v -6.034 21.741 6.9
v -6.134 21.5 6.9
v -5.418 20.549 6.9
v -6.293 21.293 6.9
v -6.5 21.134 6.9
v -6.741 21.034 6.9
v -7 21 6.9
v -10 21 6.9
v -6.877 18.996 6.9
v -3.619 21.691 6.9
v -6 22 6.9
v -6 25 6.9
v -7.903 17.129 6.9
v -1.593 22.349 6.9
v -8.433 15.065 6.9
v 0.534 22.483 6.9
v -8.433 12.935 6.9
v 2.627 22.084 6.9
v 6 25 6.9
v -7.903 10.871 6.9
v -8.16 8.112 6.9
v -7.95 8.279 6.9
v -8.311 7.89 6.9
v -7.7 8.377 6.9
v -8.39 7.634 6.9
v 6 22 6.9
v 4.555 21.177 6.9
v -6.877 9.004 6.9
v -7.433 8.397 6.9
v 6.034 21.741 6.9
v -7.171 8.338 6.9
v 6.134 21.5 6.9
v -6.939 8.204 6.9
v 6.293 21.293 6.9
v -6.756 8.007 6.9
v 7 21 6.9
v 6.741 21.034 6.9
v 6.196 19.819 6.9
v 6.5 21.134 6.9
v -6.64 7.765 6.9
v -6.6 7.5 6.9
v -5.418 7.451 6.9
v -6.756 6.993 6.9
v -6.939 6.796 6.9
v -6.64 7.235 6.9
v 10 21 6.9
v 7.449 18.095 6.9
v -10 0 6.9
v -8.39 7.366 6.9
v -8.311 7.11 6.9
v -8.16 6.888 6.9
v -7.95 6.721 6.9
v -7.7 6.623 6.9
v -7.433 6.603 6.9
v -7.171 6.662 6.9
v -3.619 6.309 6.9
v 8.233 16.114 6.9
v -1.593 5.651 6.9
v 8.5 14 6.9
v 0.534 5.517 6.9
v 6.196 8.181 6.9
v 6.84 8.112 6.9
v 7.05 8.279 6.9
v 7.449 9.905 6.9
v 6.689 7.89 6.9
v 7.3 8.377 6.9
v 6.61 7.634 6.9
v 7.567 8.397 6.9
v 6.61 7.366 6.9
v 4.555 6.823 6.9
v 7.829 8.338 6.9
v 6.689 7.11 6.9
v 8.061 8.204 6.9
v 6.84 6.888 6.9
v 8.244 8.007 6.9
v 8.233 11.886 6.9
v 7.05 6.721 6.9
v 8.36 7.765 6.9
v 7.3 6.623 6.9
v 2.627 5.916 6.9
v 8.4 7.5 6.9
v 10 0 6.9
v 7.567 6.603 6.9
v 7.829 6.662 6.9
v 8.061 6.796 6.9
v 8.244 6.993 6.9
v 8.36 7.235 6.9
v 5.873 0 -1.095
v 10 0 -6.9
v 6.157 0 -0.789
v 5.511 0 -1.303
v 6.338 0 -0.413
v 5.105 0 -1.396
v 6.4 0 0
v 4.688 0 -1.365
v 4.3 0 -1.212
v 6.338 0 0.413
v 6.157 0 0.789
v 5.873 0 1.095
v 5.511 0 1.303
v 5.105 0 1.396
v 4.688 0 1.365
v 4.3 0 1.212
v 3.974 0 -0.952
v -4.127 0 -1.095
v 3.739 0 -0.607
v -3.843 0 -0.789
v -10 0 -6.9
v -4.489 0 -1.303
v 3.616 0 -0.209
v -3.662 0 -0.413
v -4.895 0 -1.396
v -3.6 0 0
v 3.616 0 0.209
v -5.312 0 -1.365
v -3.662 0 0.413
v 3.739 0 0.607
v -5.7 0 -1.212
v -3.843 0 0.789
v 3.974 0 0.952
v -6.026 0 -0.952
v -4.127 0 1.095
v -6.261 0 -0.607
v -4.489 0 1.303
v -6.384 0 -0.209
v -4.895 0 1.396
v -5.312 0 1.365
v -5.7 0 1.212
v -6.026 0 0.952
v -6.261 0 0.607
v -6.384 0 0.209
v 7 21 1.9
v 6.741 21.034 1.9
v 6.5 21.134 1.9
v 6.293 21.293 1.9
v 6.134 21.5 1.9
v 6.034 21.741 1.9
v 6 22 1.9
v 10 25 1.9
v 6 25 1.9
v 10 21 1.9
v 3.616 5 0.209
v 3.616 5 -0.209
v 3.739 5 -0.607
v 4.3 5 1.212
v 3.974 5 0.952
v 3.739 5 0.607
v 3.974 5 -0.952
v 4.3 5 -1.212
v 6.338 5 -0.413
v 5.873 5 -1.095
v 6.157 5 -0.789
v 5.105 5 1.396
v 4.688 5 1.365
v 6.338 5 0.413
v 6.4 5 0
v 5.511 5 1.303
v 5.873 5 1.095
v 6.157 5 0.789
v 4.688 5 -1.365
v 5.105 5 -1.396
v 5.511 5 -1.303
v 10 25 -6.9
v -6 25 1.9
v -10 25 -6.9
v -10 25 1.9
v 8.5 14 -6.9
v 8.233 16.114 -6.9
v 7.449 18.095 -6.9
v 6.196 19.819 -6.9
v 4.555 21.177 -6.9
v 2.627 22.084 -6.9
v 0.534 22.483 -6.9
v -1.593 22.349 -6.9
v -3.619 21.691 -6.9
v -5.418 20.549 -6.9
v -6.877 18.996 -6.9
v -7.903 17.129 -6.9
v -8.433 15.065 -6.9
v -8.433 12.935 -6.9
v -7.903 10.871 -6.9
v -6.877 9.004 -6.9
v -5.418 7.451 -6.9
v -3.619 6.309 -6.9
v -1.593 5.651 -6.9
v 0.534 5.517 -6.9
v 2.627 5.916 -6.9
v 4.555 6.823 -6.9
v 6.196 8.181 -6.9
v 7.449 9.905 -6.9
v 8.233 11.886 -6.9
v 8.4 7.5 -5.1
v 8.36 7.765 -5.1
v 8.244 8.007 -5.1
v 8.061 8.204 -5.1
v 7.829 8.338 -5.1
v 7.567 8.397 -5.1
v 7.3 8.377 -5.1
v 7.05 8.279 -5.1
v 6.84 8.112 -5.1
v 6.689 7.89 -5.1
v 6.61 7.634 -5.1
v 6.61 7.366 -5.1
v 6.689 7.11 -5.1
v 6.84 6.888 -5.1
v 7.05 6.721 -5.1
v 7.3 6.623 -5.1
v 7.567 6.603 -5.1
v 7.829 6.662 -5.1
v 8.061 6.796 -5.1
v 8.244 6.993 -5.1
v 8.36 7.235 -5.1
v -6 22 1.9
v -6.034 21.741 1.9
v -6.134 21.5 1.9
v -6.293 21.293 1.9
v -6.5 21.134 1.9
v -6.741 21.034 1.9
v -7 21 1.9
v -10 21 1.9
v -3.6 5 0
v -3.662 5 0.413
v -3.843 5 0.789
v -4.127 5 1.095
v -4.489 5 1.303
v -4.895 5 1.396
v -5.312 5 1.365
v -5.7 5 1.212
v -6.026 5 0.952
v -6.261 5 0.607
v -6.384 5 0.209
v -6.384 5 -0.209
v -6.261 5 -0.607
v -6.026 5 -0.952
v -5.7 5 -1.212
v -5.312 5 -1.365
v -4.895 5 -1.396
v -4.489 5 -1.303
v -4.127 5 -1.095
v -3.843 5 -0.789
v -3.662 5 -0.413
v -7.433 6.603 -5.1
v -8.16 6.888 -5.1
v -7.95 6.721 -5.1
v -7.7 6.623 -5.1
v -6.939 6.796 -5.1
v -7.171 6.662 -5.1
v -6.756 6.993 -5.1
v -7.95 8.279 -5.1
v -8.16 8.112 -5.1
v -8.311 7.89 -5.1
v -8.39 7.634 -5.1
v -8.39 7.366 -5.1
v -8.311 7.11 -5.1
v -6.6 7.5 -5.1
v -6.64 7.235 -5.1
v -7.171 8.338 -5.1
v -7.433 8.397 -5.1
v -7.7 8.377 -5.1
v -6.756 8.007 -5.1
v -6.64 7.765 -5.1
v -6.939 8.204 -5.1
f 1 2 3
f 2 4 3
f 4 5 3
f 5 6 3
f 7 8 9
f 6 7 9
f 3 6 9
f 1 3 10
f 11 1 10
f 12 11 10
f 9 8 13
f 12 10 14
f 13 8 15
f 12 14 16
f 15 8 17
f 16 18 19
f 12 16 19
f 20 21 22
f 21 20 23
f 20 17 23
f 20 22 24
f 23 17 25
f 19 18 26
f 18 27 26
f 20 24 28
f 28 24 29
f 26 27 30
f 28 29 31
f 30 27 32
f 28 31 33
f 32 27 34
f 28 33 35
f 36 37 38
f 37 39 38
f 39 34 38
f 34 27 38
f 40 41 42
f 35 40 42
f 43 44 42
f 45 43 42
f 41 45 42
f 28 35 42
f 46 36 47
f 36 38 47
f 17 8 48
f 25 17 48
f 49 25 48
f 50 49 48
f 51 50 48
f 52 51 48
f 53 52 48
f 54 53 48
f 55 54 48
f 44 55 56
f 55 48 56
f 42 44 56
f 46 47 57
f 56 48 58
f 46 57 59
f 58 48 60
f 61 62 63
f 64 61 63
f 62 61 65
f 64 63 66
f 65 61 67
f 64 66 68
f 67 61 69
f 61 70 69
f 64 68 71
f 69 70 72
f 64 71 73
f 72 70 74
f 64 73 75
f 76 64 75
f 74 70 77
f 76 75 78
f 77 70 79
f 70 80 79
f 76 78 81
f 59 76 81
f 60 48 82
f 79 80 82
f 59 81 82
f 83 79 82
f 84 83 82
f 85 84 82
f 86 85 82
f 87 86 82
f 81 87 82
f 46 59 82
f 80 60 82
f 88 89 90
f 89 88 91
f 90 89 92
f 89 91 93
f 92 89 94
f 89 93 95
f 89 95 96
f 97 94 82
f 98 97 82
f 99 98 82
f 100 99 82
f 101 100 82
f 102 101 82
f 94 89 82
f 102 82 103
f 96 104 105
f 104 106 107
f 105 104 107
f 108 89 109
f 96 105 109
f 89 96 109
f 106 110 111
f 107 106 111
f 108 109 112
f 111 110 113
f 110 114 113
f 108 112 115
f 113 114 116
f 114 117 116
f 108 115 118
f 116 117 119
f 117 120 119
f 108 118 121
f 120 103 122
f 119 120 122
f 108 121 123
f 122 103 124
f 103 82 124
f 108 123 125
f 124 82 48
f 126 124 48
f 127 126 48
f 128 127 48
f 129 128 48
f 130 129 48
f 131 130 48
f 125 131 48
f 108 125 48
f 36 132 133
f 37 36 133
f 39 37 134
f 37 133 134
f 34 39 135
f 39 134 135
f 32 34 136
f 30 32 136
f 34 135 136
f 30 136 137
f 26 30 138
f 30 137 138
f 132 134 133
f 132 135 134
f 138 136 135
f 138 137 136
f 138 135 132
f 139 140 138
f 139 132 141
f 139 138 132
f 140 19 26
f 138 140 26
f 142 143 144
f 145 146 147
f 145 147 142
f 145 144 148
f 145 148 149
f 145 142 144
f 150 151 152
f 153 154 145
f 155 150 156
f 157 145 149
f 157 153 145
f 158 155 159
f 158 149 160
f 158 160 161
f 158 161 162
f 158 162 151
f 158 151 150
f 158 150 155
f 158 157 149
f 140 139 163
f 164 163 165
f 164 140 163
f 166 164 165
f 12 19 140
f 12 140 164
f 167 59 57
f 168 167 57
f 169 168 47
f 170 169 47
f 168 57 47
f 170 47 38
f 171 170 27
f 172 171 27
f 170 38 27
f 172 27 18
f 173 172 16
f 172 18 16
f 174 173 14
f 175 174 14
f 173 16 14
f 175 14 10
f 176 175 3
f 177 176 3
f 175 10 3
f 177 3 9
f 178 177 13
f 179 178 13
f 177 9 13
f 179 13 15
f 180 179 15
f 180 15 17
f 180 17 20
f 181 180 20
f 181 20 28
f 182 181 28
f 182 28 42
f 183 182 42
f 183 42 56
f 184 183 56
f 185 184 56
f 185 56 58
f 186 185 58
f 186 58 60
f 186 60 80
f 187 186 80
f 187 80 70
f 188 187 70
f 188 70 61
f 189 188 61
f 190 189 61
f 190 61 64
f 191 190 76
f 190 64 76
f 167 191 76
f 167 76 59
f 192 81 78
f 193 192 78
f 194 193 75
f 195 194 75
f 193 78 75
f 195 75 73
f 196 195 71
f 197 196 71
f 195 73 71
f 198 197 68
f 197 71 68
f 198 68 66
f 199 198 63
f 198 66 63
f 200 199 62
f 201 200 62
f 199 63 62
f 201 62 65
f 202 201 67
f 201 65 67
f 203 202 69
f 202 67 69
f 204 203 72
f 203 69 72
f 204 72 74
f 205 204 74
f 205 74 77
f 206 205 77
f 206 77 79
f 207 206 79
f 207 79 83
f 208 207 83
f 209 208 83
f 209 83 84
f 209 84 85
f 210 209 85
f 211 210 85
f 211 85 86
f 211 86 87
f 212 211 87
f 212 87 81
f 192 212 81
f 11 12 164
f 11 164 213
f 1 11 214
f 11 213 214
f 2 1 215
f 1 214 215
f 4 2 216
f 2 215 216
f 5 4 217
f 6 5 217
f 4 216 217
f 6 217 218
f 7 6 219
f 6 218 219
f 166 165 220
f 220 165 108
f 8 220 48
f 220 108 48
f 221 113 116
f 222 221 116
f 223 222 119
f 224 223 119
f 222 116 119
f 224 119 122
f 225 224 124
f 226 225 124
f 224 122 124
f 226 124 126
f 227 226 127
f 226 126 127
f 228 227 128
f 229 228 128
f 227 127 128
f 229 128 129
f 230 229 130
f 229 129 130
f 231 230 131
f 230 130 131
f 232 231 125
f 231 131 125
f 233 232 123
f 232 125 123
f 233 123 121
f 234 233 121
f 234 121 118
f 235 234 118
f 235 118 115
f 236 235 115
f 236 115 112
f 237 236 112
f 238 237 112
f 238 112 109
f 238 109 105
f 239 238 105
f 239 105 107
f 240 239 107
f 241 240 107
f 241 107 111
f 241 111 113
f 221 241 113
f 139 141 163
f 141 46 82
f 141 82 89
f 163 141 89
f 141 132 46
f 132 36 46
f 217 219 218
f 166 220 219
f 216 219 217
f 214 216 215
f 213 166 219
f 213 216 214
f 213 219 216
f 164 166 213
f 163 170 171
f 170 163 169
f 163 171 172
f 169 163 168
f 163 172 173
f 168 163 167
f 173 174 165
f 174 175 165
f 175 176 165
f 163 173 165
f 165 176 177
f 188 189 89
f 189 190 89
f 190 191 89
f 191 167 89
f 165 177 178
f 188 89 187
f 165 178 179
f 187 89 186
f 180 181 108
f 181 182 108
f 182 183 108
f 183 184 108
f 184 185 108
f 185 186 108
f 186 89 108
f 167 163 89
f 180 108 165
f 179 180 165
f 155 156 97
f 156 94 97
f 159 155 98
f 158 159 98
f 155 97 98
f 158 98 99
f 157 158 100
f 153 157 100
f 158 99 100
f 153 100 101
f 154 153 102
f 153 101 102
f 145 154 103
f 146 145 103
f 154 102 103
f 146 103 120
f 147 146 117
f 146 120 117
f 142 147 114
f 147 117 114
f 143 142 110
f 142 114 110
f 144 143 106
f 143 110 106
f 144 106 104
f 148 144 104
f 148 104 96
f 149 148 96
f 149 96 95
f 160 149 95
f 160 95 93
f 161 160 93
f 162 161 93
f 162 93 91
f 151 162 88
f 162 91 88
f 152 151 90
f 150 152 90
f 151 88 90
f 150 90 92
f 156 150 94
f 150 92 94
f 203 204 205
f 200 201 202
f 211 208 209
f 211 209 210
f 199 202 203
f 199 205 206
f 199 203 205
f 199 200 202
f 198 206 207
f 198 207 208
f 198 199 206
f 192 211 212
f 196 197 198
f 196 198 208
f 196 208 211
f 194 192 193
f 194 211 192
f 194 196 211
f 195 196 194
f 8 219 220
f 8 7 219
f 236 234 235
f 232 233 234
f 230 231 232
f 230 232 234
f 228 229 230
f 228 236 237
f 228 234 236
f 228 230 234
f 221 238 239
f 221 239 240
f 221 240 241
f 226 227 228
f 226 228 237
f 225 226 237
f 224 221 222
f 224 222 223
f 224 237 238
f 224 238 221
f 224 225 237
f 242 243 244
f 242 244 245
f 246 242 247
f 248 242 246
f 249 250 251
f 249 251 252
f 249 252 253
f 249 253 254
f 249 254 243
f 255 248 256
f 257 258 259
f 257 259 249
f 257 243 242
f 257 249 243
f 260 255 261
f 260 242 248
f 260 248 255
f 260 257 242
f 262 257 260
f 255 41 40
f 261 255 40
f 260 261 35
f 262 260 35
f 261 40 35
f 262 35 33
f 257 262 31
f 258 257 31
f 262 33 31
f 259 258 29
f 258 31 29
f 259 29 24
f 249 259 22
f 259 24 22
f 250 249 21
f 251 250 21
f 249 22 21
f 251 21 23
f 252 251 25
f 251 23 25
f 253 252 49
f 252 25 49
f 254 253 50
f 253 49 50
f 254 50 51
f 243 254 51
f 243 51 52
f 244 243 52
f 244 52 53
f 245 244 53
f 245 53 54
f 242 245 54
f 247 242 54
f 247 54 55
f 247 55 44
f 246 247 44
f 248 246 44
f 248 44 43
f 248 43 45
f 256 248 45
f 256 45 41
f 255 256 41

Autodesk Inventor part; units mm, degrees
ref_plane "YZ Plane" through (0, 0, 0) normal (1, 0, 0) x (0, 1, 0)
ref_plane "XZ Plane" through (0, 0, 0) normal (0, 1, 0) x (-1, 0, 0)
ref_plane "XY Plane" through (0, 0, 0) normal (0, 0, 1) x (1, 0, 0)
sketch "Sketch1" plane through (0, 0, 0) normal (0, 1, 0) x (-1, 0, 0)
  line L0 (-10, -6.9) -> (10, -6.9)
  line L1 (10, -6.9) -> (10, 6.9)
  line L2 (10, 6.9) -> (-10, 6.9)
  line L3 (-10, 6.9) -> (-10, -6.9)
  line L4 (-10, -6.9) -> (10, 6.9) construction
  line L5 (10, -6.9) -> (-10, 6.9) construction
  point P0 (0, 0)
  dimension "d0" = 20
  dimension "d1" = 13.8
extrude "Extrusion1" add sketch "Sketch1" along normal blind 25
sketch "Sketch2" plane through (-10, 0, 6.9) normal (0, 0, 1) x (1, 0, 0)
  circle A0 centre (10, 14) radius 8.5
  circle A1 centre (2.5, 7.5) radius 0.9
  circle A2 centre (17.5, 7.5) radius 0.9
  point P0 (10, 0)
  dimension "d14" = 17
  dimension "d18" = 1.8
  dimension "d21" = 1.8
extrude "Extrusion2" cut sketch "Sketch2" against normal through all contours A0
sketch "Sketch3" plane through (-10, 0, 6.9) normal (0, 0, 1) x (1, 0, 0)
  circle A0 centre (10, 14) radius 8.5
  circle A1 centre (2.5, 7.5) radius 0.9
  circle A2 centre (17.5, 7.5) radius 0.9
  point P0 (10, 0)
  point P1 (10, 0)
  dimension "d24" = 17
  dimension "d25" = 1.8
  dimension "d26" = 1.8
extrude "Extrusion3" cut sketch "Sketch3" against normal blind 12 contours A1 | A2
sketch "Sketch5" plane through (-10, 0, 6.9) normal (0, 0, 1) x (1, 0, 0)
  circle A0 centre (2.5, 7.5) radius 0.9 projected
  circle A1 centre (17.5, 7.5) radius 0.9 projected
  circle A2 centre (10, 14) radius 8.5 projected
  line L0 (0, 0) -> (20, 0) projected
  line L1 (20, 0) -> (20, 25) projected
  line L2 (0, 25) -> (20, 25) projected
  line L3 (0, 0) -> (0, 25) projected
  line L4 (10, 0) -> (10, 5)
  line L5 (0, 25) -> (4, 25)
  line L6 (4, 25) -> (4, 21)
  line L7 (4, 21) -> (0, 21)
  line L8 (20, 25) -> (16, 25)
  line L9 (0, 25) -> (20, 25) projected
  line L10 (16, 25) -> (16, 21)
  line L11 (16, 21) -> (20, 21)
  line L12 (20, 25) -> (20, 21)
  line L13 (20, 0) -> (20, 25) projected
  line L14 (0, 25) -> (4, 25)
  line L15 (4, 25) -> (4, 21)
  line L16 (4, 21) -> (0, 21)
  line L17 (0, 21) -> (0, 25)
  line L18 (16, 25) -> (20, 25)
  line L19 (20, 25) -> (20, 21)
  line L20 (20, 21) -> (16, 21)
  line L21 (16, 21) -> (16, 25)
  dimension "d33" = 5
  dimension "d38" = 4
  dimension "d39" = 4
  dimension "d40" = 4
extrude "Extrusion4" cut sketch "Sketch5" against normal blind 5 contours L3 L2 L6 L7 | L11 L10 L2 L1
fillet "Fillet1" radius 1 2 edges at (-6, 21, 4.4) (6, 21, 4.4)
sketch "Sketch6" plane through (0, 0, 0) normal (0, -1, 0) x (1, 0, 0)
  circle A0 centre (-5, 0) radius 1.4
  circle A1 centre (5, 0) radius 1.4
  point P0 (0, 0)
  dimension "d46" = 2.8
  dimension "d47" = 2.8
extrude "Extrusion5" cut sketch "Sketch6" against normal blind 5
properties part number "Sonar Mount" material "ABS Plastic"
